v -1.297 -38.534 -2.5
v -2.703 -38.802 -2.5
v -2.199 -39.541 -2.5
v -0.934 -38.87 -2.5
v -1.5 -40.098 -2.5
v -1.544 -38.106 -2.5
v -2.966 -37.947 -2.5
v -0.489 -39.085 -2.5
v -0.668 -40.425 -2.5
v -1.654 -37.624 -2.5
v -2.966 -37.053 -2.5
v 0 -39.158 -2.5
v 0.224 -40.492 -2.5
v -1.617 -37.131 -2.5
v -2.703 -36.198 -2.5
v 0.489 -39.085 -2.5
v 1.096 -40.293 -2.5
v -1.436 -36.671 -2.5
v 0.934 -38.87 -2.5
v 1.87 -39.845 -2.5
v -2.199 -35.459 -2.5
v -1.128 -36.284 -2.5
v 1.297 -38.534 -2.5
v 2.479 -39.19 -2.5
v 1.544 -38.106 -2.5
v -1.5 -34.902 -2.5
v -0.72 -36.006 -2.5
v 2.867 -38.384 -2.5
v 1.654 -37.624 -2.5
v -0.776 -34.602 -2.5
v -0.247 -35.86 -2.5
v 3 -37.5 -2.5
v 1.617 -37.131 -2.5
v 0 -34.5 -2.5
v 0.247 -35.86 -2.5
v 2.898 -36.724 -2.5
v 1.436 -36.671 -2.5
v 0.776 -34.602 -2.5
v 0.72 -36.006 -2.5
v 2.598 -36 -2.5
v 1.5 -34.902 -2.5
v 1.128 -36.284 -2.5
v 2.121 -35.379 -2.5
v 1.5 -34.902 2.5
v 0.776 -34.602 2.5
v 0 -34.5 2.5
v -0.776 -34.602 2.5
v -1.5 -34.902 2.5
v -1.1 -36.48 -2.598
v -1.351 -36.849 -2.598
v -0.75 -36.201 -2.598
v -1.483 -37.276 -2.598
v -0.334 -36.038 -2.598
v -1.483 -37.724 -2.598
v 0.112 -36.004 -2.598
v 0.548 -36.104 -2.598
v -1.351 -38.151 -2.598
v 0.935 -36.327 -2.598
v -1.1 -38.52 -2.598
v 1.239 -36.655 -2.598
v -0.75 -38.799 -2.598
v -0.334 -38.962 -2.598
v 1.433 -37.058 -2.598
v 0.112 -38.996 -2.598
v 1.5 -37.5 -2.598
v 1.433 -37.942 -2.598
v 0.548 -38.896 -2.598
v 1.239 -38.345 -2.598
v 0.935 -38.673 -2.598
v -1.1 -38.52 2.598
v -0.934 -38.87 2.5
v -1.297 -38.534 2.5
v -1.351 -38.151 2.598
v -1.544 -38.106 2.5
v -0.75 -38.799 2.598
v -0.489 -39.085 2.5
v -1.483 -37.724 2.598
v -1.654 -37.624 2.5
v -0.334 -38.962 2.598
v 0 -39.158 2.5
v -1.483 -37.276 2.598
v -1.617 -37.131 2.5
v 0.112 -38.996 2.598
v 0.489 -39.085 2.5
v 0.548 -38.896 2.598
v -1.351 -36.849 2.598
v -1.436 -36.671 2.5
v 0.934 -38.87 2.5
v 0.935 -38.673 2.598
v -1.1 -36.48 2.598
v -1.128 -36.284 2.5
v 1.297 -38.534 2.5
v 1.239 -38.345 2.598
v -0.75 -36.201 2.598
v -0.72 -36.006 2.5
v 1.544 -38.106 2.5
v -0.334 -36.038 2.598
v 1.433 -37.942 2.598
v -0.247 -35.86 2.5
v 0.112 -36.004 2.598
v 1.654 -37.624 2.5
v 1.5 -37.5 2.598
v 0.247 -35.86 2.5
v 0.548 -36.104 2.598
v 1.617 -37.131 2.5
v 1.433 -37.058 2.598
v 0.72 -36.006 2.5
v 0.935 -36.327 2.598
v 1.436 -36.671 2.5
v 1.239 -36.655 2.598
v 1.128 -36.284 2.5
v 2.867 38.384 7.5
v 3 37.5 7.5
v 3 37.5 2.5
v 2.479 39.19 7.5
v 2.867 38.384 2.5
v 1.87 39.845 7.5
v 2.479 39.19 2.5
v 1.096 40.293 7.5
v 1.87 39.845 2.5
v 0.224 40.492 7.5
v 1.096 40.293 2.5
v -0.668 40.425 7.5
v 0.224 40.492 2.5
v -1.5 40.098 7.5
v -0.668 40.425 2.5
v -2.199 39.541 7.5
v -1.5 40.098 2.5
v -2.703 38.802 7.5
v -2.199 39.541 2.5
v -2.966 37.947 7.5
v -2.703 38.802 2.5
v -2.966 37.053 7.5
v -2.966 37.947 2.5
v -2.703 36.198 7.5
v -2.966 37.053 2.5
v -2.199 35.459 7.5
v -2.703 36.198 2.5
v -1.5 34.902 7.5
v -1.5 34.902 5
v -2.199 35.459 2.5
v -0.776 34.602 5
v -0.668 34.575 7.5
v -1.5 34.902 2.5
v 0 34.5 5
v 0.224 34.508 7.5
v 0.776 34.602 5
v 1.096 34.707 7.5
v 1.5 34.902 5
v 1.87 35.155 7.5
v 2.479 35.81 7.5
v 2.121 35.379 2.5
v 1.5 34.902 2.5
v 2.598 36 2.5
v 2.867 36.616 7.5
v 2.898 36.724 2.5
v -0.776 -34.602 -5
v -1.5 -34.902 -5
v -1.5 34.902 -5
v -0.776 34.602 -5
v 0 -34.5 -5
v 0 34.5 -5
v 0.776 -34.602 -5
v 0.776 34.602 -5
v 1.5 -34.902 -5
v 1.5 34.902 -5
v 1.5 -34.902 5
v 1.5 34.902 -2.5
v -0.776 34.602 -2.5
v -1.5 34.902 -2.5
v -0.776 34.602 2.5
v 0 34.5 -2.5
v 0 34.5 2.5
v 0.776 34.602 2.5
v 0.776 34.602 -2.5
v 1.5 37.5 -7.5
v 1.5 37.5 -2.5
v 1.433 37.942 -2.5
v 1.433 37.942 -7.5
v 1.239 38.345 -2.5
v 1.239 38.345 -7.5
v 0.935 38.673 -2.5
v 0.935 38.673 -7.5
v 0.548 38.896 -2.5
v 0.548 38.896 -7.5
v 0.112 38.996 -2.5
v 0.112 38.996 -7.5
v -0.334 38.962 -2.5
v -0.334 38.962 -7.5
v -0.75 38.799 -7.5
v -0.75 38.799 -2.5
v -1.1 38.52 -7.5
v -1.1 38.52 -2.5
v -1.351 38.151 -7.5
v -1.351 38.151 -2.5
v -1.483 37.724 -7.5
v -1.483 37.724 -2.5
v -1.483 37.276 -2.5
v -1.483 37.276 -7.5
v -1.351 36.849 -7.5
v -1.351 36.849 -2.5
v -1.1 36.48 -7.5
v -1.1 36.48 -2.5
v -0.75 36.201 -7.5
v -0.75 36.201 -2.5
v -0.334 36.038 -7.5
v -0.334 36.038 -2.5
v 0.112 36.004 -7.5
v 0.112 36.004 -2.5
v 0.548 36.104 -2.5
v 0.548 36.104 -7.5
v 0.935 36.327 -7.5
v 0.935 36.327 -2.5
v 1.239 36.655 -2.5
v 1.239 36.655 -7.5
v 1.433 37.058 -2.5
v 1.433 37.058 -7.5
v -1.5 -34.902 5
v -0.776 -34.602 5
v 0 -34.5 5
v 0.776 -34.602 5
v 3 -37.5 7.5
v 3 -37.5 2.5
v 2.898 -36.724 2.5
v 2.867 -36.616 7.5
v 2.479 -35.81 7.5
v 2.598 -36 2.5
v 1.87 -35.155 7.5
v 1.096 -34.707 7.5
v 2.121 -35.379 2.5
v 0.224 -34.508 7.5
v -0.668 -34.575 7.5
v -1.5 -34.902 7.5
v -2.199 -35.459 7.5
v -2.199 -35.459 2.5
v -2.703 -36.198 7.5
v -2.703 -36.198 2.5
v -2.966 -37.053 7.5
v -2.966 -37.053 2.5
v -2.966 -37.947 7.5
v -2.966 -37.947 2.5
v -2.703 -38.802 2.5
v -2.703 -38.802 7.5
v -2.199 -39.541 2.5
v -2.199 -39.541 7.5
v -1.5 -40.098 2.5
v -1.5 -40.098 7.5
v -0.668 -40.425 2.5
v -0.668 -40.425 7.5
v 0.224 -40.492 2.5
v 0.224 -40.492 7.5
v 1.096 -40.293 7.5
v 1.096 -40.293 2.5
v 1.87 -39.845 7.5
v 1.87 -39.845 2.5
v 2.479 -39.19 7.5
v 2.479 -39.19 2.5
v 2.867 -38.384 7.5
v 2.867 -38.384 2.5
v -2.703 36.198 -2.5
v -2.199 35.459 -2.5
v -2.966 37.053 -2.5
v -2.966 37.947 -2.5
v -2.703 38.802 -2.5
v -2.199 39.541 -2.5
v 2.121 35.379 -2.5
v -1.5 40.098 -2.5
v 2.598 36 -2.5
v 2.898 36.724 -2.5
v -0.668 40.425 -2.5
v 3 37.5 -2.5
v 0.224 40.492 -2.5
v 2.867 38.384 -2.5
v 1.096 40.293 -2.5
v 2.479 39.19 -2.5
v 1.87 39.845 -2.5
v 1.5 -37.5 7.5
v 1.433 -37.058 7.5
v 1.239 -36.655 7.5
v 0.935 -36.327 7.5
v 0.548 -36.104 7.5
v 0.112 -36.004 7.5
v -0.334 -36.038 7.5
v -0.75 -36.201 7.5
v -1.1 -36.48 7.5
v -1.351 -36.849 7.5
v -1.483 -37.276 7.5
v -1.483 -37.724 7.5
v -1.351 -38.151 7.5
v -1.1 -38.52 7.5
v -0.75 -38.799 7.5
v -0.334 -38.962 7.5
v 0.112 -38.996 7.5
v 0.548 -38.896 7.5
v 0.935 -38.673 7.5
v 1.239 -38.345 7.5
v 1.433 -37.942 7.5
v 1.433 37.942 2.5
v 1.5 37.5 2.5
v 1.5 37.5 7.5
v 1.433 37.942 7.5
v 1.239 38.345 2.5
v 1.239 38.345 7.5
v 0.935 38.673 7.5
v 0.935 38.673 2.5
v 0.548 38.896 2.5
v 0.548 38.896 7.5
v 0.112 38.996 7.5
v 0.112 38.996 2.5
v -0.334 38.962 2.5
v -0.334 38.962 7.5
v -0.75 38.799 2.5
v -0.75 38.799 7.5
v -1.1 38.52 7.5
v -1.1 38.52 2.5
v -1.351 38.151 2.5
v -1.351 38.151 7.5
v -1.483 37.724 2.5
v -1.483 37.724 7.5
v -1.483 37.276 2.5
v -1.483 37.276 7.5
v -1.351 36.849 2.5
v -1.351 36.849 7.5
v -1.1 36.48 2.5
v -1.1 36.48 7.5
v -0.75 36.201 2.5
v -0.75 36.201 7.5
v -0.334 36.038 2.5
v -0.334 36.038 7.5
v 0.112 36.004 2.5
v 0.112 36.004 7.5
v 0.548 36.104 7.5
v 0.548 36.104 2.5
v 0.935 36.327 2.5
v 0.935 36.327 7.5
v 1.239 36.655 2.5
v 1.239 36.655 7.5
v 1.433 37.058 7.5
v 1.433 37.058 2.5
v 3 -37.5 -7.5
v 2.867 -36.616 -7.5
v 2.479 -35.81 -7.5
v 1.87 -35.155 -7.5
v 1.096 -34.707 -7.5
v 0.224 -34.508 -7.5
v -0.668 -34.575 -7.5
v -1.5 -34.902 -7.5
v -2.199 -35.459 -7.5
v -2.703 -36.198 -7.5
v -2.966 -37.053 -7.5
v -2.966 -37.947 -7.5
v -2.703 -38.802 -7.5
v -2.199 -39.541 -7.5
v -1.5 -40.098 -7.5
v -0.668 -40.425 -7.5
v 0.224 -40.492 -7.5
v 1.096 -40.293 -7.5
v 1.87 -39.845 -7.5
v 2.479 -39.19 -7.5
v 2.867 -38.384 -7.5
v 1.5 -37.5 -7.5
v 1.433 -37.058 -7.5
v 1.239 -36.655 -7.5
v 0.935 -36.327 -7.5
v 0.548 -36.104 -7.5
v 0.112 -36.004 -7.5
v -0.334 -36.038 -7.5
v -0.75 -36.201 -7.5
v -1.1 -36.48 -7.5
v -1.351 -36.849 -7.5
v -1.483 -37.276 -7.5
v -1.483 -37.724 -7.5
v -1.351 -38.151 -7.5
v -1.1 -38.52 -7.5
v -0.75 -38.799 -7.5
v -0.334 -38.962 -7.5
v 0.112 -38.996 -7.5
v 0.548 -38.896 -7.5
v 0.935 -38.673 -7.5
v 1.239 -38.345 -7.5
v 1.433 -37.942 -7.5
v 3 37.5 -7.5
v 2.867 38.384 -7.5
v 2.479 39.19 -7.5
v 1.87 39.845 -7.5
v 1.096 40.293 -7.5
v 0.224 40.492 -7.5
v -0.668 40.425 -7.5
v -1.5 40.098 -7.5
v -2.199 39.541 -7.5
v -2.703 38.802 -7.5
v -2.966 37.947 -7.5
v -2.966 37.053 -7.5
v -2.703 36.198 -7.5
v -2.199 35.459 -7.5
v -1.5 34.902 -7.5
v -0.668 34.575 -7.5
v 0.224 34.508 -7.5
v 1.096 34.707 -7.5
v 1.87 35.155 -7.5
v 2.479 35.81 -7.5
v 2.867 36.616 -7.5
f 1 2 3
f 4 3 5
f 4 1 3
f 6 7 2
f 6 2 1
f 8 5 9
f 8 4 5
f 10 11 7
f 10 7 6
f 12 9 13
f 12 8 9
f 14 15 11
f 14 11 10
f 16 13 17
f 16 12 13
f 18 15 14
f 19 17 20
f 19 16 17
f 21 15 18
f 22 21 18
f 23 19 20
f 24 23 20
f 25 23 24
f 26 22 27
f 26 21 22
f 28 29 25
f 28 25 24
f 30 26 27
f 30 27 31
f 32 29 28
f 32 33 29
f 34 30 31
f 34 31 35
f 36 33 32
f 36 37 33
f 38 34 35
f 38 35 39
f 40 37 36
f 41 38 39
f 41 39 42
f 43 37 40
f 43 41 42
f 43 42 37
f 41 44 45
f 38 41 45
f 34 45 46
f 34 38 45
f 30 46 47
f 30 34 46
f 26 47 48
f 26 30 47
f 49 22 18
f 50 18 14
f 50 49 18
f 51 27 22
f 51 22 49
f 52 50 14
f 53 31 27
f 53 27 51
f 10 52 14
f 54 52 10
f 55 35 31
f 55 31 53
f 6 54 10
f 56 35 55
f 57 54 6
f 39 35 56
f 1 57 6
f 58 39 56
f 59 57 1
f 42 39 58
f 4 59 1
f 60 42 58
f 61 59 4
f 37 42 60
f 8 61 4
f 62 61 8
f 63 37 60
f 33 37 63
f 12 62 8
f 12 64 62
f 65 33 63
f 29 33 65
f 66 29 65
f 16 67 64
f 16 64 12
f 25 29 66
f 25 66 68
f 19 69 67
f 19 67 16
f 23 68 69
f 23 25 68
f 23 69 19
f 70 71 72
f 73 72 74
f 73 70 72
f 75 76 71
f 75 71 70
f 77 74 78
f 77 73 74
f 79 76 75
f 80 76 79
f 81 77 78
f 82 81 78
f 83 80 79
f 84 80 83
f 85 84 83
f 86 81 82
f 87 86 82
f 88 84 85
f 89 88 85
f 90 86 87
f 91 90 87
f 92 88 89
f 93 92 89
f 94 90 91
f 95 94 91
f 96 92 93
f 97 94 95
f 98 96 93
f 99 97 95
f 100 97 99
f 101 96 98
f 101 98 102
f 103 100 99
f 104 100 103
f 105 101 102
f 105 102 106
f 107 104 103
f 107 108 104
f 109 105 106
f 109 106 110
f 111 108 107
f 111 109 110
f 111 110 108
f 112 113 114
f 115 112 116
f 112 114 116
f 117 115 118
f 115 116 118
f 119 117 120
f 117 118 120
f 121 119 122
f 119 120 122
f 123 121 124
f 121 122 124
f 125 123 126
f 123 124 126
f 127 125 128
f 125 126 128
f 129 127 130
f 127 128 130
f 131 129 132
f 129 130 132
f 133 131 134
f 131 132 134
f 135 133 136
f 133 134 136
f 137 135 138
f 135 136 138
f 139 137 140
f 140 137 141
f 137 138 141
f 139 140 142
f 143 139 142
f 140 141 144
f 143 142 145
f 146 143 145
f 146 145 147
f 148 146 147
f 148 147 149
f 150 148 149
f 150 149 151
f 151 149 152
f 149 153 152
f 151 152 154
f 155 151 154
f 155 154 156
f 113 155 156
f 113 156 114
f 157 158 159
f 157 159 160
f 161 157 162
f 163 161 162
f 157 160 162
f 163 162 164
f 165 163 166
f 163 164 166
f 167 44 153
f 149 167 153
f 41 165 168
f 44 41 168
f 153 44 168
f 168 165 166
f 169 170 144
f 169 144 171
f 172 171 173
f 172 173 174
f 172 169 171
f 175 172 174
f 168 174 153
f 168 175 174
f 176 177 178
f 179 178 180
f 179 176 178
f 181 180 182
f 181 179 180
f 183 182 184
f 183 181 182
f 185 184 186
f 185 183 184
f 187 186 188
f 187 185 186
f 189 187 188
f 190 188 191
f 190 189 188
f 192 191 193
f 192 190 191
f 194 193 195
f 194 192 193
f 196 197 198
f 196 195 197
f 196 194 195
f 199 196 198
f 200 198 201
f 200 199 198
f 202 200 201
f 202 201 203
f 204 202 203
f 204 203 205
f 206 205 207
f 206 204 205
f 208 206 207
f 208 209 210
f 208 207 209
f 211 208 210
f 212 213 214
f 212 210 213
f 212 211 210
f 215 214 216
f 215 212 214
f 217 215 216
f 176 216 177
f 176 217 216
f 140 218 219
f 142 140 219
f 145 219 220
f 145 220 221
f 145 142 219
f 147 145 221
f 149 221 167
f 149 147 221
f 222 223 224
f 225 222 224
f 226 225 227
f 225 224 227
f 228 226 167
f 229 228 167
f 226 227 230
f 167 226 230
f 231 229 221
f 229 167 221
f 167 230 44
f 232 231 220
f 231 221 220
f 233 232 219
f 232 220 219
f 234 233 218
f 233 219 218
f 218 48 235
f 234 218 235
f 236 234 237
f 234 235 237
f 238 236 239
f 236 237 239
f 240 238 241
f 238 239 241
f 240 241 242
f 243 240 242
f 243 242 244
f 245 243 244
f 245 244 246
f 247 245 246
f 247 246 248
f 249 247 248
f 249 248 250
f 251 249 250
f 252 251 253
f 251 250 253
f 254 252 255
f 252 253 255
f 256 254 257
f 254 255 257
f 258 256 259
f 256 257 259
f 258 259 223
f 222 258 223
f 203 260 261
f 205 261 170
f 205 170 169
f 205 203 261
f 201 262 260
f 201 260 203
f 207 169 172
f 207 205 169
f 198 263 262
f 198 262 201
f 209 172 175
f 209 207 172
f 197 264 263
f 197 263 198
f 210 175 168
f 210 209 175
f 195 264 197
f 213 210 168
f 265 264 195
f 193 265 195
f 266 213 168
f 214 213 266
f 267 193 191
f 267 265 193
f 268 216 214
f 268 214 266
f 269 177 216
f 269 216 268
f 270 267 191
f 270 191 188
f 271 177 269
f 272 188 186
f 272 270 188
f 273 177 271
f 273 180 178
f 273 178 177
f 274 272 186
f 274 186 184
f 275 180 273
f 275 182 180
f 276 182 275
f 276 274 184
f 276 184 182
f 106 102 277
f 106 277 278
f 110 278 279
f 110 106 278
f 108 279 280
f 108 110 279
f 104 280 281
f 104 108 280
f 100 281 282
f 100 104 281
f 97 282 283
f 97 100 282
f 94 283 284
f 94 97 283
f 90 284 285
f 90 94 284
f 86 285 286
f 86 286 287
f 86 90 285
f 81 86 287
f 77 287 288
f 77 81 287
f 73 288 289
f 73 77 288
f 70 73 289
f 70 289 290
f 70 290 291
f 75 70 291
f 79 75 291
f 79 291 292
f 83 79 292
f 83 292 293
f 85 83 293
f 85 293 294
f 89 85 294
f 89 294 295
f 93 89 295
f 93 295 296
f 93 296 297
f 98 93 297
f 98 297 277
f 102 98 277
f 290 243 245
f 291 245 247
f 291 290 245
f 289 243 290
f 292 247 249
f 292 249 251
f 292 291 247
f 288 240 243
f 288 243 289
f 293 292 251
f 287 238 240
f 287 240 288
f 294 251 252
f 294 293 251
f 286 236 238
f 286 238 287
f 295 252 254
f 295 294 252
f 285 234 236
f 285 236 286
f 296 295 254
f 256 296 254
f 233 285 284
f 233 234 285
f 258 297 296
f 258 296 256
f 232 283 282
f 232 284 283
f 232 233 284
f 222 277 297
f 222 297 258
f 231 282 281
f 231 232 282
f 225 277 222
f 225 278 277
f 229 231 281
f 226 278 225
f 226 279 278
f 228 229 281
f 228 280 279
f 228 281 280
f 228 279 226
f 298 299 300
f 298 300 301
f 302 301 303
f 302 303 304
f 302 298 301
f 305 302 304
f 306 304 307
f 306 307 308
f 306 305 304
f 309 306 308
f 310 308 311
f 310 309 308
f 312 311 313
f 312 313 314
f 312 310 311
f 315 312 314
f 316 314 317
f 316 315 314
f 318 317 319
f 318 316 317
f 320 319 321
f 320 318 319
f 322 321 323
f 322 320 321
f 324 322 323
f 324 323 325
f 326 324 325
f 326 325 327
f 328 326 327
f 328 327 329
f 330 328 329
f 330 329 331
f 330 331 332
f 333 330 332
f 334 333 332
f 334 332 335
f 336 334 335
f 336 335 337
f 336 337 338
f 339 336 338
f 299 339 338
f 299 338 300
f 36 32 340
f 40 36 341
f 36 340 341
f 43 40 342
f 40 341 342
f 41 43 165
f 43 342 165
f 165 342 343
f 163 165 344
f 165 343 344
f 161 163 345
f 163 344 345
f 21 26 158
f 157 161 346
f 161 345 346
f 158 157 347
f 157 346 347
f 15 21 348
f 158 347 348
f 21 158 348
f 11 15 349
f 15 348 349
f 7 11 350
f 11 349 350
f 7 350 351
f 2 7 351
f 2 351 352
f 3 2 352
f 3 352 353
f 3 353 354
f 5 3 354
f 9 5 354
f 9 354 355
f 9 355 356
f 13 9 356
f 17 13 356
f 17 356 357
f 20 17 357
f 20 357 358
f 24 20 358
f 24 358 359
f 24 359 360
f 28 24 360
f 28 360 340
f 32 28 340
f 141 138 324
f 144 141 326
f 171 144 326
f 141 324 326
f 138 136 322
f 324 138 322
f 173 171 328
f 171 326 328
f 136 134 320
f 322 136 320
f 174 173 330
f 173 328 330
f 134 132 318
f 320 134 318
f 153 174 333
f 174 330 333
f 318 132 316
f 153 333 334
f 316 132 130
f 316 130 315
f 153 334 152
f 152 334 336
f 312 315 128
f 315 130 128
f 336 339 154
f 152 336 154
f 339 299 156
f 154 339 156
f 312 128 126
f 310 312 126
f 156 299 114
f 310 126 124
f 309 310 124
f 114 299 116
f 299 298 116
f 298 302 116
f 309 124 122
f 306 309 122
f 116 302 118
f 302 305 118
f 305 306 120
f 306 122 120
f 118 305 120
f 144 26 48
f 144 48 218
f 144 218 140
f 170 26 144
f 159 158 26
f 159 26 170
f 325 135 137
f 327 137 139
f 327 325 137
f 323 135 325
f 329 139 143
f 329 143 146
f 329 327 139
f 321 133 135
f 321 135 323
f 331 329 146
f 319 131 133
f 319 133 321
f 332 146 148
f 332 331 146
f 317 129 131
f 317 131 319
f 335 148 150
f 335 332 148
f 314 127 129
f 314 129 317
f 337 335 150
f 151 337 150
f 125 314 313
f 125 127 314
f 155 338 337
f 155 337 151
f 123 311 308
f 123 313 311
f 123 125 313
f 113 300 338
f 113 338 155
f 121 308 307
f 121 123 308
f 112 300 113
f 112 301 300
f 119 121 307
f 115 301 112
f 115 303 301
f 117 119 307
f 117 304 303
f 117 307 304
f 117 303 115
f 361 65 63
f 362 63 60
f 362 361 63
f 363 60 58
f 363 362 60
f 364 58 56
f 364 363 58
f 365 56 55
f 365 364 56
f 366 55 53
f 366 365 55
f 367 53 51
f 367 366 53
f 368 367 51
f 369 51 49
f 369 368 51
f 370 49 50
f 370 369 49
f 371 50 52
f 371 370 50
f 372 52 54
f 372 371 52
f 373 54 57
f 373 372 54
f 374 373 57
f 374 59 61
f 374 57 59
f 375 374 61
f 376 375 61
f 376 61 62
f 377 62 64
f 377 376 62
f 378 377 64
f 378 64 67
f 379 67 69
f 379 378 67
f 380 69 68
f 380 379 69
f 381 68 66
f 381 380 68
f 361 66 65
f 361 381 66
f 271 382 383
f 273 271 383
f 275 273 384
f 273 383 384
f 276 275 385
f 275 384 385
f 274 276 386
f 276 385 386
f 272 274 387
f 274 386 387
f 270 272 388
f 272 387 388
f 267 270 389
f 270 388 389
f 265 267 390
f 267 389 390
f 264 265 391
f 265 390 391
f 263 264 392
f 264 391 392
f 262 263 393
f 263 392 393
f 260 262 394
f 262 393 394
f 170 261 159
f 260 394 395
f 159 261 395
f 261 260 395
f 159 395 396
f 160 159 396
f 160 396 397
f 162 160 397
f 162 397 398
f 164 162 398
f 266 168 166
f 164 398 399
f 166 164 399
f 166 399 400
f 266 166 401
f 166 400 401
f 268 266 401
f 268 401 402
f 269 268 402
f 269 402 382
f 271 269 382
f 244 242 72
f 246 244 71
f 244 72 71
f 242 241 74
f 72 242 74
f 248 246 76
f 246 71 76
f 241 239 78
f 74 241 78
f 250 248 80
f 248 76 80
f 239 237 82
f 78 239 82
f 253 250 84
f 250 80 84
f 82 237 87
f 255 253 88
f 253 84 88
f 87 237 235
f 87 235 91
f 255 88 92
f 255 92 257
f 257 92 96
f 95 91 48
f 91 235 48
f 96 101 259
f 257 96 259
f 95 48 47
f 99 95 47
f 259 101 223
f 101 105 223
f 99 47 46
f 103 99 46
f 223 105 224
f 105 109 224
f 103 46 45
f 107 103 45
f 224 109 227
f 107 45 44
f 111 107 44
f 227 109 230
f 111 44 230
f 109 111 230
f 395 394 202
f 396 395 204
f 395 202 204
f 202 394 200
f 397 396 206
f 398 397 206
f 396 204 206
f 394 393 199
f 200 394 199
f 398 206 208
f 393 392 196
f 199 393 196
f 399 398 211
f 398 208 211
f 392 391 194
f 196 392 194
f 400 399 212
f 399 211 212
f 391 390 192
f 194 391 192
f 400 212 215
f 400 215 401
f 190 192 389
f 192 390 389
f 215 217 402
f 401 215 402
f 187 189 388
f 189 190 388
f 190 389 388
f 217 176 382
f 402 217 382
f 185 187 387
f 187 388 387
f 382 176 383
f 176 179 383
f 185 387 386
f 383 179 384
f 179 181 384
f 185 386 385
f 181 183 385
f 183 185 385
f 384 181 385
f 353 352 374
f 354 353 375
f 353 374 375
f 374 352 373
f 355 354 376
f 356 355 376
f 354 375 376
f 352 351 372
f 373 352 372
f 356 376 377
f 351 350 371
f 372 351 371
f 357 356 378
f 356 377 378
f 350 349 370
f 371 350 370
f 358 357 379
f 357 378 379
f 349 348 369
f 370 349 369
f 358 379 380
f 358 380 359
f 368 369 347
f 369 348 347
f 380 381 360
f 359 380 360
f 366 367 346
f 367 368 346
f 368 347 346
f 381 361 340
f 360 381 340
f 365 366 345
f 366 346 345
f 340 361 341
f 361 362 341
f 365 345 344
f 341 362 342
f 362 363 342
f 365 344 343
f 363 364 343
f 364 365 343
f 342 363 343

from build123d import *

# Parameters (mm, degrees)
SALIENTE_EXTRUIR1_DEPTH      = 5
SALIENTE_EXTRUIR1_DEPTH_BACK = 5
CROQUIS1_W                   = 3
CROQUIS1_H                   = 75
SALIENTE_EXTRUIR3_DEPTH      = 7.5
SALIENTE_EXTRUIR3_DEPTH_BACK = 7.5
CROQUIS1_4_R                 = 3
CROQUIS1_4_R_2               = 1.5
CORTAR_EXTRUIR1_DEPTH        = 2.5
CORTAR_EXTRUIR1_DEPTH_BACK   = 2.5
CROQUIS1_5_R                 = 3
CORTAR_EXTRUIR2_DEPTH        = 10
CORTAR_EXTRUIR2_DEPTH_BACK   = 10
CROQUIS1_6_R                 = 1.5


with BuildPart() as part:
    # Croquis1 → Saliente-Extruir1 (new, two sides: drawn at the far end of the back side and taken through both)
    with BuildSketch(Plane.XY.offset(-SALIENTE_EXTRUIR1_DEPTH_BACK)):
        Rectangle(CROQUIS1_W, CROQUIS1_H)
    extrude(amount=SALIENTE_EXTRUIR1_DEPTH + SALIENTE_EXTRUIR1_DEPTH_BACK)

    # Croquis1<4> → Saliente-Extruir3 (add, two sides: drawn at the far end of the back side and taken through both)
    # profile 1 of 2: a face of its own
    with BuildSketch(Plane.XY.offset(-SALIENTE_EXTRUIR3_DEPTH_BACK)):
        with Locations((0, 37.5)):
            Circle(CROQUIS1_4_R)
        with Locations((0, 37.5)):
            Circle(CROQUIS1_4_R_2, mode=Mode.SUBTRACT)
    # profile 2 of 2: a face of its own
    with BuildSketch(Plane.XY.offset(-SALIENTE_EXTRUIR3_DEPTH_BACK)):
        with Locations((0, -37.5)):
            Circle(CROQUIS1_4_R)
        with Locations((0, -37.5)):
            Circle(CROQUIS1_4_R_2, mode=Mode.SUBTRACT)
    extrude(amount=SALIENTE_EXTRUIR3_DEPTH + SALIENTE_EXTRUIR3_DEPTH_BACK)

    # Croquis1<5> → Cortar-Extruir1 (cut, two sides: drawn at the far end of the back side and taken through both)
    with BuildSketch(Plane.XY.offset(-CORTAR_EXTRUIR1_DEPTH_BACK)):
        with Locations((0, 37.5)):
            Circle(CROQUIS1_5_R)
        with Locations((0, -37.5)):
            Circle(CROQUIS1_5_R)
    extrude(amount=CORTAR_EXTRUIR1_DEPTH + CORTAR_EXTRUIR1_DEPTH_BACK, mode=Mode.SUBTRACT)

    # Croquis1<6> → Cortar-Extruir2 (cut, two sides: drawn at the far end of the back side and taken through both)
    with BuildSketch(Plane.XY.offset(-CORTAR_EXTRUIR2_DEPTH_BACK)):
        with Locations((0, 37.5)):
            Circle(CROQUIS1_6_R)
        with Locations((0, -37.5)):
            Circle(CROQUIS1_6_R)
    extrude(amount=CORTAR_EXTRUIR2_DEPTH + CORTAR_EXTRUIR2_DEPTH_BACK, mode=Mode.SUBTRACT)

    # Croquis1<11> → Cortar-Revolución2 (revolve, cut)
    with BuildSketch(Plane.XY):
        with BuildLine():
            ThreePointArc((-3, -37.5), (0, -40.5), (3, -37.5))
            Line((3, -37.5), (-3, -37.5))
        make_face()
    revolve(axis=Axis((3, -37.5, 0), (-1, 0, 0)), mode=Mode.SUBTRACT)


solid = part.part
